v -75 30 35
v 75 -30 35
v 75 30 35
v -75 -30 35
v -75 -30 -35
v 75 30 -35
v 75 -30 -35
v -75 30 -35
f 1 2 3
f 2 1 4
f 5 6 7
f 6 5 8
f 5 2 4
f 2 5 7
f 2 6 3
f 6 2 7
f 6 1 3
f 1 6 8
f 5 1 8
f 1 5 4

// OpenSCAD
// ========================================
// a 150 x 60 x 70 mm box
// NeuroCAD canonical IR; dimensions are millimetres
// ========================================
$fn = 48;

cube(size=[150, 60, 70], center=true);
